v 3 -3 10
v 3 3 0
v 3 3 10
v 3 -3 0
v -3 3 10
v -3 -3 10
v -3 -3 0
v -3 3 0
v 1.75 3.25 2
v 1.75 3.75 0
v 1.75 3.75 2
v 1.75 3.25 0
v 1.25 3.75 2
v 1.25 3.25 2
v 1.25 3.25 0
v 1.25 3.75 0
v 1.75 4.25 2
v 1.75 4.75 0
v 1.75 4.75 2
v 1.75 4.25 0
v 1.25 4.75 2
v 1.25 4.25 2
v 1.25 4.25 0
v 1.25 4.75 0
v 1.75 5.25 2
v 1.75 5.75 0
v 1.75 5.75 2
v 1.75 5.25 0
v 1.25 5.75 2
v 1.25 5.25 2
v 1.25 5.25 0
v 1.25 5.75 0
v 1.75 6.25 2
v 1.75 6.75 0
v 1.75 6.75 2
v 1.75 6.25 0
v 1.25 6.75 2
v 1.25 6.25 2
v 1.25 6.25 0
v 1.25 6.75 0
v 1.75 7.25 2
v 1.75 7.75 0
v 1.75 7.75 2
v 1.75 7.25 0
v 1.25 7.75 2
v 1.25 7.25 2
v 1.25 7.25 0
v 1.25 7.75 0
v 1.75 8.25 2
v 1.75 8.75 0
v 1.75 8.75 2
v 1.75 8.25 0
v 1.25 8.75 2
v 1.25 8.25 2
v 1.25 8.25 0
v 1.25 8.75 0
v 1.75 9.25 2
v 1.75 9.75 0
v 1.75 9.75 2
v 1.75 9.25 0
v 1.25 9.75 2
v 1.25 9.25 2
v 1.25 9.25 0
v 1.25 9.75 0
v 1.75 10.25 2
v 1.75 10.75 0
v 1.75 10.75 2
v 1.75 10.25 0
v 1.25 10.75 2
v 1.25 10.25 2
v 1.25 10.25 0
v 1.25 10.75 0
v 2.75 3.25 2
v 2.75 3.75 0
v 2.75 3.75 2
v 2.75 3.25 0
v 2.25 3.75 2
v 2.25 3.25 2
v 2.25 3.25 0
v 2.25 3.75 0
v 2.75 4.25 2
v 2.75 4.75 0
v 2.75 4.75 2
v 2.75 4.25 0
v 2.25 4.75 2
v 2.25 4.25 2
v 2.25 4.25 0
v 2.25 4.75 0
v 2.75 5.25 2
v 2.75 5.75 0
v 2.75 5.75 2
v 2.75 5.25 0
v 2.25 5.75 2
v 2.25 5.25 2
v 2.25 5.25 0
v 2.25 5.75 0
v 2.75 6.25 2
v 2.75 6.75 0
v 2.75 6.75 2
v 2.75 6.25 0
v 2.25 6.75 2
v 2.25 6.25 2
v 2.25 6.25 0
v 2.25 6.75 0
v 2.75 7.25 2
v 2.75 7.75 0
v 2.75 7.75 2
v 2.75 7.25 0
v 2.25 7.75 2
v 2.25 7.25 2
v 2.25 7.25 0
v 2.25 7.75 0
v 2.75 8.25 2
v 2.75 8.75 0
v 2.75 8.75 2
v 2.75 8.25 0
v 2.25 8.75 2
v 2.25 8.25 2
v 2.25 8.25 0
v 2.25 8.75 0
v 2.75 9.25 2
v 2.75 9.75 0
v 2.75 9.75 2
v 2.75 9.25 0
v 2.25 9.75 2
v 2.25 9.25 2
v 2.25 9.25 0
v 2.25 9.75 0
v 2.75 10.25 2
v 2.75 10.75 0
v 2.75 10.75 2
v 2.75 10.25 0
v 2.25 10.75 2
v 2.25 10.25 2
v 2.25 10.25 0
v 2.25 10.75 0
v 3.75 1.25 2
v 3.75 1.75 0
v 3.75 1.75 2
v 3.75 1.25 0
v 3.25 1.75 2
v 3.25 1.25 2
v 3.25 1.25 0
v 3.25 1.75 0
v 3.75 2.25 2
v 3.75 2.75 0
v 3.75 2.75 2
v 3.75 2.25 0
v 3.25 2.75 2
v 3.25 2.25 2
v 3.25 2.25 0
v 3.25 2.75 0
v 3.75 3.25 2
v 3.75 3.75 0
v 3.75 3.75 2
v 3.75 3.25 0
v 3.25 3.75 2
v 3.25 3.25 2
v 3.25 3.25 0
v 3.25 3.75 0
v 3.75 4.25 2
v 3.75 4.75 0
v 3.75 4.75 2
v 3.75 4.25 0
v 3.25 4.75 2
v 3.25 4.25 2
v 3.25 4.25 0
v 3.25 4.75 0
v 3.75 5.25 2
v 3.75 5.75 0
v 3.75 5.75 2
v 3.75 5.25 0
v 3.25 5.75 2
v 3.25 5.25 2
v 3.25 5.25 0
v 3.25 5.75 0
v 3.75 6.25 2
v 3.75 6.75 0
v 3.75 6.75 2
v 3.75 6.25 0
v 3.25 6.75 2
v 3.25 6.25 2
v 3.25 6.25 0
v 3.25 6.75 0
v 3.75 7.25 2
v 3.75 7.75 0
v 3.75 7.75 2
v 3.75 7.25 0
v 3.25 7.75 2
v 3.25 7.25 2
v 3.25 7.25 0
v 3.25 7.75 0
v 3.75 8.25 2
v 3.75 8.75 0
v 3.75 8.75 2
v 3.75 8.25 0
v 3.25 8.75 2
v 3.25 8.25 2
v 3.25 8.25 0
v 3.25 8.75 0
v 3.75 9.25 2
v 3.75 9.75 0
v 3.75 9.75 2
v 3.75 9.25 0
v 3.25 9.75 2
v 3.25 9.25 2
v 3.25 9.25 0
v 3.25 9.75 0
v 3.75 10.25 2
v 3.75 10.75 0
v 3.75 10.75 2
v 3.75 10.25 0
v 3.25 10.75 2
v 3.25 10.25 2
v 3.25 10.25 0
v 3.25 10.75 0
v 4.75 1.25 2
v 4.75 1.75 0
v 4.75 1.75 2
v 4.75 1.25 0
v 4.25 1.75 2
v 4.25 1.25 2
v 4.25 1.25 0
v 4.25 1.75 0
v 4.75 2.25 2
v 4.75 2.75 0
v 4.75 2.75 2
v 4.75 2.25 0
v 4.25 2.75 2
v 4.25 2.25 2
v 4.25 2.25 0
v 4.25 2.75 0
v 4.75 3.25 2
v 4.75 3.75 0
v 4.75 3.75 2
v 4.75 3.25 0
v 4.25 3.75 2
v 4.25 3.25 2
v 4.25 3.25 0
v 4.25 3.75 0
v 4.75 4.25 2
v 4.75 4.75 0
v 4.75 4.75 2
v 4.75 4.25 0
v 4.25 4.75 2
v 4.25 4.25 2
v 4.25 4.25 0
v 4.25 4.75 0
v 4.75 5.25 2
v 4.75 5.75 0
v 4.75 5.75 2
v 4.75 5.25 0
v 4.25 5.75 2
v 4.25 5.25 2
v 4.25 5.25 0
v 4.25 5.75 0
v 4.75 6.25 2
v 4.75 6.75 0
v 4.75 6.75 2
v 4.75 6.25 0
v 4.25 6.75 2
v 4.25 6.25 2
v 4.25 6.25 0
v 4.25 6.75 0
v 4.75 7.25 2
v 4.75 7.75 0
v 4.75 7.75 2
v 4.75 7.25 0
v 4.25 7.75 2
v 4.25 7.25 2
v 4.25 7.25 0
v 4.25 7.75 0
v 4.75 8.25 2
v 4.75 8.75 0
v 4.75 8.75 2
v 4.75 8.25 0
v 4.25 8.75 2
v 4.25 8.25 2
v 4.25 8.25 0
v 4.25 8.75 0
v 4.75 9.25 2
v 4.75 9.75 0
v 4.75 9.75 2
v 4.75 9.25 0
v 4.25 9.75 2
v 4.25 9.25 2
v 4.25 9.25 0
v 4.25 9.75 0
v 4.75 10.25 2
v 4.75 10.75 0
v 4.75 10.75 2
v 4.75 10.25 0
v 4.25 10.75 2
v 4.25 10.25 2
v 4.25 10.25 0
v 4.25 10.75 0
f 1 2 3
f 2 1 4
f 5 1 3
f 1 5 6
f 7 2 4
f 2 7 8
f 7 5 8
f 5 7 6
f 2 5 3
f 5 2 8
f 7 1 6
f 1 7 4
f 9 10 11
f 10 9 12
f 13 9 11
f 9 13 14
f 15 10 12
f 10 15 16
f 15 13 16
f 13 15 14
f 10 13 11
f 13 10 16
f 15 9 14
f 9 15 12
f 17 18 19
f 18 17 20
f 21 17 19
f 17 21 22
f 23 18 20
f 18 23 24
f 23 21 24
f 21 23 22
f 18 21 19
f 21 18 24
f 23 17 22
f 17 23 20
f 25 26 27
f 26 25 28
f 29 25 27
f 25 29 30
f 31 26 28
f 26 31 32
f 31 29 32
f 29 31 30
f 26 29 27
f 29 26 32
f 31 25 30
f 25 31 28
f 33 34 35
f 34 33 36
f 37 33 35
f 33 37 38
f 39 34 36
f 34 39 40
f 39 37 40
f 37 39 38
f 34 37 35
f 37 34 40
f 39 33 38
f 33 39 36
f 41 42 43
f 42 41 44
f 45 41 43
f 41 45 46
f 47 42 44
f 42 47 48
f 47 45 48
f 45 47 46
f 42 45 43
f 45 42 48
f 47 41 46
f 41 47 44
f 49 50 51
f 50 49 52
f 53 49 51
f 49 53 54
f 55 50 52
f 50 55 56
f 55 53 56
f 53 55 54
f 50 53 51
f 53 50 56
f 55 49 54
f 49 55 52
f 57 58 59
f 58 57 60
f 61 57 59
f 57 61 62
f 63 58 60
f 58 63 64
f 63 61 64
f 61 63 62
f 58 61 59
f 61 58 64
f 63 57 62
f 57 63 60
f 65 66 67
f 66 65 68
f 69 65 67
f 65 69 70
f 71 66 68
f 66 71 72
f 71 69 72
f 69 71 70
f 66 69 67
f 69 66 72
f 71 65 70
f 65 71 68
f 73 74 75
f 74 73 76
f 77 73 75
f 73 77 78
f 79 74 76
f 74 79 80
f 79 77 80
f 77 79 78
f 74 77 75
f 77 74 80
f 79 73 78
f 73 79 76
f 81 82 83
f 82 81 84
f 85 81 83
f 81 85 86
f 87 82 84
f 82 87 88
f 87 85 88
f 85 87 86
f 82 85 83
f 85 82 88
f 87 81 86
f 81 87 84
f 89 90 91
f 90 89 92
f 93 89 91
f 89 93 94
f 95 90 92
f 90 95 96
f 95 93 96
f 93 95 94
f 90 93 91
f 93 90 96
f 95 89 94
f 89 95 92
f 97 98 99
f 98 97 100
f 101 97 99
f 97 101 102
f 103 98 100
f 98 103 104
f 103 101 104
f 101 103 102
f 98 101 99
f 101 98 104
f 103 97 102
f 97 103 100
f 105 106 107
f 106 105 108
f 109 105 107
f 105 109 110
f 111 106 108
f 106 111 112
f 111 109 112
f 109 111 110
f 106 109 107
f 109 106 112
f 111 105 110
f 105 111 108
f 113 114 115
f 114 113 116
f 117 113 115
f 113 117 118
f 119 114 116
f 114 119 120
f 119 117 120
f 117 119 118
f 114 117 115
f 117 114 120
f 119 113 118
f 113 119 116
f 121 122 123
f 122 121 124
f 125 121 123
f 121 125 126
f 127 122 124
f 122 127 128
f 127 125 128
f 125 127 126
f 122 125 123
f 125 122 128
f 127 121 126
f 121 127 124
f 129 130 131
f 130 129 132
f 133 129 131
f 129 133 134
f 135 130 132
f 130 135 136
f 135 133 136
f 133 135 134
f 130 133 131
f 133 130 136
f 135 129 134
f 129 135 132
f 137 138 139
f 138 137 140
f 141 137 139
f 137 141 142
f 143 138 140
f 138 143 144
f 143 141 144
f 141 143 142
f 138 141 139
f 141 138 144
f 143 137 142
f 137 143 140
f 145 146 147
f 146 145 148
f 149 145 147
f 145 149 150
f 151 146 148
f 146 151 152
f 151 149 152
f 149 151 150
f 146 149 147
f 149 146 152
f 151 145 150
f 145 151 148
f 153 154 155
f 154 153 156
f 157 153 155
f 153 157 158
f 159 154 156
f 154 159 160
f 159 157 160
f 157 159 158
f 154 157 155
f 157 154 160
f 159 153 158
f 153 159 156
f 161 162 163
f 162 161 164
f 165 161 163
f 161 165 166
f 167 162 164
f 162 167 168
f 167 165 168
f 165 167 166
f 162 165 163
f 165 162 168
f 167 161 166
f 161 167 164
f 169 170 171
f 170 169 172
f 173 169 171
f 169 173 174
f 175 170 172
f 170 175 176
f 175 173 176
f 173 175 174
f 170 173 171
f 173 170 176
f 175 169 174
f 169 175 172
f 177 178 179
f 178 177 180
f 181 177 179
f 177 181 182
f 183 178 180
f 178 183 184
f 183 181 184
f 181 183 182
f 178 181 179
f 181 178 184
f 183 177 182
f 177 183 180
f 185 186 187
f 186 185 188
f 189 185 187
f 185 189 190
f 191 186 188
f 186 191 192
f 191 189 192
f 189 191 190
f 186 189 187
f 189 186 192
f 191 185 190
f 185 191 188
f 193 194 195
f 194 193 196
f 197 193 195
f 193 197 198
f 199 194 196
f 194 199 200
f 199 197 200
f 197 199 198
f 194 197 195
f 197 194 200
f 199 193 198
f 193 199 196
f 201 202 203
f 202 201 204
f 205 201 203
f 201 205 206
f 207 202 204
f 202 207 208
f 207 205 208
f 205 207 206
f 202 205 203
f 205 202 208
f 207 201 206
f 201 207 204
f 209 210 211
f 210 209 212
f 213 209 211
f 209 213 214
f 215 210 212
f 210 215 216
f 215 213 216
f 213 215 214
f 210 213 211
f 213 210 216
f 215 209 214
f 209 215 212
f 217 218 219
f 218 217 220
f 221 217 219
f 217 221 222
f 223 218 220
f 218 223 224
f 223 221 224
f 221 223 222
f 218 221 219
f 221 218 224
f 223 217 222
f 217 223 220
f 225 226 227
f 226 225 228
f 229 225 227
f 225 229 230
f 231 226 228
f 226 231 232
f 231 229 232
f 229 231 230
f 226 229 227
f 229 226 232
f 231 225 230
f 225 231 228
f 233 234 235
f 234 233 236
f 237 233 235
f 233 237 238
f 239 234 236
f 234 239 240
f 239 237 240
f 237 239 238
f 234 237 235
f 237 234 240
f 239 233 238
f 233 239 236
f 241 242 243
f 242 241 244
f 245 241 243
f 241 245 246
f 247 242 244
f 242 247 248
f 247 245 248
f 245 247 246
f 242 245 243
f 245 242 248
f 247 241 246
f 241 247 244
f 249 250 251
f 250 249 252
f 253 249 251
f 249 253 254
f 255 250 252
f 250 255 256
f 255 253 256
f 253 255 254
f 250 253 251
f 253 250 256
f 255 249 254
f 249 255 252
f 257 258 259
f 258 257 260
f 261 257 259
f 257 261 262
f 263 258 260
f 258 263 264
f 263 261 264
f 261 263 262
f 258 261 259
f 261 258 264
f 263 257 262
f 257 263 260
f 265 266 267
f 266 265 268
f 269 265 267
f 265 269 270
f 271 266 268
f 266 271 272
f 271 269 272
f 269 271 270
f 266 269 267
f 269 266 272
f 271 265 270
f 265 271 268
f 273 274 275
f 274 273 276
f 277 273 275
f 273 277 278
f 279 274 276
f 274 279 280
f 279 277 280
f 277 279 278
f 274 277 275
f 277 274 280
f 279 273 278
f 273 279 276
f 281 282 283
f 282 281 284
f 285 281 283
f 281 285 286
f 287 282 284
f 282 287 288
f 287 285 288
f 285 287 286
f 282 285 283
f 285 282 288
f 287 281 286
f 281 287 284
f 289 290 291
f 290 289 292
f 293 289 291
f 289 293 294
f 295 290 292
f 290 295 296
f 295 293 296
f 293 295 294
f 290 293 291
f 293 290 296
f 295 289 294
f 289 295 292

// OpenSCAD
translate([0, 0, 5]) color([0,1,0,0.9]) cube([6, 6, 10], center=true);
translate([1.5, 1.5, 1]) color([1,0,0]) cube([0.5, 0.5, 2], center=true);
translate([1.5, 2.5, 1]) color([1,0,0]) cube([0.5, 0.5, 2], center=true);
translate([1.5, 3.5, 1]) color([1,0,0]) cube([0.5, 0.5, 2], center=true);
translate([1.5, 4.5, 1]) color([1,0,0]) cube([0.5, 0.5, 2], center=true);
translate([1.5, 5.5, 1]) color([1,0,0]) cube([0.5, 0.5, 2], center=true);
translate([1.5, 6.5, 1]) color([1,0,0]) cube([0.5, 0.5, 2], center=true);
translate([1.5, 7.5, 1]) color([1,0,0]) cube([0.5, 0.5, 2], center=true);
translate([1.5, 8.5, 1]) color([1,0,0]) cube([0.5, 0.5, 2], center=true);
translate([1.5, 9.5, 1]) color([1,0,0]) cube([0.5, 0.5, 2], center=true);
translate([1.5, 10.5, 1]) color([1,0,0]) cube([0.5, 0.5, 2], center=true);
translate([2.5, 1.5, 1]) color([1,0,0]) cube([0.5, 0.5, 2], center=true);
translate([2.5, 2.5, 1]) color([1,0,0]) cube([0.5, 0.5, 2], center=true);
translate([2.5, 3.5, 1]) color([1,0,0]) cube([0.5, 0.5, 2], center=true);
translate([2.5, 4.5, 1]) color([1,0,0]) cube([0.5, 0.5, 2], center=true);
translate([2.5, 5.5, 1]) color([1,0,0]) cube([0.5, 0.5, 2], center=true);
translate([2.5, 6.5, 1]) color([1,0,0]) cube([0.5, 0.5, 2], center=true);
translate([2.5, 7.5, 1]) color([1,0,0]) cube([0.5, 0.5, 2], center=true);
translate([2.5, 8.5, 1]) color([1,0,0]) cube([0.5, 0.5, 2], center=true);
translate([2.5, 9.5, 1]) color([1,0,0]) cube([0.5, 0.5, 2], center=true);
translate([2.5, 10.5, 1]) color([1,0,0]) cube([0.5, 0.5, 2], center=true);
translate([3.5, 1.5, 1]) color([1,0,0]) cube([0.5, 0.5, 2], center=true);
translate([3.5, 2.5, 1]) color([1,0,0]) cube([0.5, 0.5, 2], center=true);
translate([3.5, 3.5, 1]) color([1,0,0]) cube([0.5, 0.5, 2], center=true);
translate([3.5, 4.5, 1]) color([1,0,0]) cube([0.5, 0.5, 2], center=true);
translate([3.5, 5.5, 1]) color([1,0,0]) cube([0.5, 0.5, 2], center=true);
translate([3.5, 6.5, 1]) color([1,0,0]) cube([0.5, 0.5, 2], center=true);
translate([3.5, 7.5, 1]) color([1,0,0]) cube([0.5, 0.5, 2], center=true);
translate([3.5, 8.5, 1]) color([1,0,0]) cube([0.5, 0.5, 2], center=true);
translate([3.5, 9.5, 1]) color([1,0,0]) cube([0.5, 0.5, 2], center=true);
translate([3.5, 10.5, 1]) color([1,0,0]) cube([0.5, 0.5, 2], center=true);
translate([4.5, 1.5, 1]) color([1,0,0]) cube([0.5, 0.5, 2], center=true);
translate([4.5, 2.5, 1]) color([1,0,0]) cube([0.5, 0.5, 2], center=true);
translate([4.5, 3.5, 1]) color([1,0,0]) cube([0.5, 0.5, 2], center=true);
translate([4.5, 4.5, 1]) color([1,0,0]) cube([0.5, 0.5, 2], center=true);
translate([4.5, 5.5, 1]) color([1,0,0]) cube([0.5, 0.5, 2], center=true);
translate([4.5, 6.5, 1]) color([1,0,0]) cube([0.5, 0.5, 2], center=true);
translate([4.5, 7.5, 1]) color([1,0,0]) cube([0.5, 0.5, 2], center=true);
translate([4.5, 8.5, 1]) color([1,0,0]) cube([0.5, 0.5, 2], center=true);
translate([4.5, 9.5, 1]) color([1,0,0]) cube([0.5, 0.5, 2], center=true);
translate([4.5, 10.5, 1]) color([1,0,0]) cube([0.5, 0.5, 2], center=true);
